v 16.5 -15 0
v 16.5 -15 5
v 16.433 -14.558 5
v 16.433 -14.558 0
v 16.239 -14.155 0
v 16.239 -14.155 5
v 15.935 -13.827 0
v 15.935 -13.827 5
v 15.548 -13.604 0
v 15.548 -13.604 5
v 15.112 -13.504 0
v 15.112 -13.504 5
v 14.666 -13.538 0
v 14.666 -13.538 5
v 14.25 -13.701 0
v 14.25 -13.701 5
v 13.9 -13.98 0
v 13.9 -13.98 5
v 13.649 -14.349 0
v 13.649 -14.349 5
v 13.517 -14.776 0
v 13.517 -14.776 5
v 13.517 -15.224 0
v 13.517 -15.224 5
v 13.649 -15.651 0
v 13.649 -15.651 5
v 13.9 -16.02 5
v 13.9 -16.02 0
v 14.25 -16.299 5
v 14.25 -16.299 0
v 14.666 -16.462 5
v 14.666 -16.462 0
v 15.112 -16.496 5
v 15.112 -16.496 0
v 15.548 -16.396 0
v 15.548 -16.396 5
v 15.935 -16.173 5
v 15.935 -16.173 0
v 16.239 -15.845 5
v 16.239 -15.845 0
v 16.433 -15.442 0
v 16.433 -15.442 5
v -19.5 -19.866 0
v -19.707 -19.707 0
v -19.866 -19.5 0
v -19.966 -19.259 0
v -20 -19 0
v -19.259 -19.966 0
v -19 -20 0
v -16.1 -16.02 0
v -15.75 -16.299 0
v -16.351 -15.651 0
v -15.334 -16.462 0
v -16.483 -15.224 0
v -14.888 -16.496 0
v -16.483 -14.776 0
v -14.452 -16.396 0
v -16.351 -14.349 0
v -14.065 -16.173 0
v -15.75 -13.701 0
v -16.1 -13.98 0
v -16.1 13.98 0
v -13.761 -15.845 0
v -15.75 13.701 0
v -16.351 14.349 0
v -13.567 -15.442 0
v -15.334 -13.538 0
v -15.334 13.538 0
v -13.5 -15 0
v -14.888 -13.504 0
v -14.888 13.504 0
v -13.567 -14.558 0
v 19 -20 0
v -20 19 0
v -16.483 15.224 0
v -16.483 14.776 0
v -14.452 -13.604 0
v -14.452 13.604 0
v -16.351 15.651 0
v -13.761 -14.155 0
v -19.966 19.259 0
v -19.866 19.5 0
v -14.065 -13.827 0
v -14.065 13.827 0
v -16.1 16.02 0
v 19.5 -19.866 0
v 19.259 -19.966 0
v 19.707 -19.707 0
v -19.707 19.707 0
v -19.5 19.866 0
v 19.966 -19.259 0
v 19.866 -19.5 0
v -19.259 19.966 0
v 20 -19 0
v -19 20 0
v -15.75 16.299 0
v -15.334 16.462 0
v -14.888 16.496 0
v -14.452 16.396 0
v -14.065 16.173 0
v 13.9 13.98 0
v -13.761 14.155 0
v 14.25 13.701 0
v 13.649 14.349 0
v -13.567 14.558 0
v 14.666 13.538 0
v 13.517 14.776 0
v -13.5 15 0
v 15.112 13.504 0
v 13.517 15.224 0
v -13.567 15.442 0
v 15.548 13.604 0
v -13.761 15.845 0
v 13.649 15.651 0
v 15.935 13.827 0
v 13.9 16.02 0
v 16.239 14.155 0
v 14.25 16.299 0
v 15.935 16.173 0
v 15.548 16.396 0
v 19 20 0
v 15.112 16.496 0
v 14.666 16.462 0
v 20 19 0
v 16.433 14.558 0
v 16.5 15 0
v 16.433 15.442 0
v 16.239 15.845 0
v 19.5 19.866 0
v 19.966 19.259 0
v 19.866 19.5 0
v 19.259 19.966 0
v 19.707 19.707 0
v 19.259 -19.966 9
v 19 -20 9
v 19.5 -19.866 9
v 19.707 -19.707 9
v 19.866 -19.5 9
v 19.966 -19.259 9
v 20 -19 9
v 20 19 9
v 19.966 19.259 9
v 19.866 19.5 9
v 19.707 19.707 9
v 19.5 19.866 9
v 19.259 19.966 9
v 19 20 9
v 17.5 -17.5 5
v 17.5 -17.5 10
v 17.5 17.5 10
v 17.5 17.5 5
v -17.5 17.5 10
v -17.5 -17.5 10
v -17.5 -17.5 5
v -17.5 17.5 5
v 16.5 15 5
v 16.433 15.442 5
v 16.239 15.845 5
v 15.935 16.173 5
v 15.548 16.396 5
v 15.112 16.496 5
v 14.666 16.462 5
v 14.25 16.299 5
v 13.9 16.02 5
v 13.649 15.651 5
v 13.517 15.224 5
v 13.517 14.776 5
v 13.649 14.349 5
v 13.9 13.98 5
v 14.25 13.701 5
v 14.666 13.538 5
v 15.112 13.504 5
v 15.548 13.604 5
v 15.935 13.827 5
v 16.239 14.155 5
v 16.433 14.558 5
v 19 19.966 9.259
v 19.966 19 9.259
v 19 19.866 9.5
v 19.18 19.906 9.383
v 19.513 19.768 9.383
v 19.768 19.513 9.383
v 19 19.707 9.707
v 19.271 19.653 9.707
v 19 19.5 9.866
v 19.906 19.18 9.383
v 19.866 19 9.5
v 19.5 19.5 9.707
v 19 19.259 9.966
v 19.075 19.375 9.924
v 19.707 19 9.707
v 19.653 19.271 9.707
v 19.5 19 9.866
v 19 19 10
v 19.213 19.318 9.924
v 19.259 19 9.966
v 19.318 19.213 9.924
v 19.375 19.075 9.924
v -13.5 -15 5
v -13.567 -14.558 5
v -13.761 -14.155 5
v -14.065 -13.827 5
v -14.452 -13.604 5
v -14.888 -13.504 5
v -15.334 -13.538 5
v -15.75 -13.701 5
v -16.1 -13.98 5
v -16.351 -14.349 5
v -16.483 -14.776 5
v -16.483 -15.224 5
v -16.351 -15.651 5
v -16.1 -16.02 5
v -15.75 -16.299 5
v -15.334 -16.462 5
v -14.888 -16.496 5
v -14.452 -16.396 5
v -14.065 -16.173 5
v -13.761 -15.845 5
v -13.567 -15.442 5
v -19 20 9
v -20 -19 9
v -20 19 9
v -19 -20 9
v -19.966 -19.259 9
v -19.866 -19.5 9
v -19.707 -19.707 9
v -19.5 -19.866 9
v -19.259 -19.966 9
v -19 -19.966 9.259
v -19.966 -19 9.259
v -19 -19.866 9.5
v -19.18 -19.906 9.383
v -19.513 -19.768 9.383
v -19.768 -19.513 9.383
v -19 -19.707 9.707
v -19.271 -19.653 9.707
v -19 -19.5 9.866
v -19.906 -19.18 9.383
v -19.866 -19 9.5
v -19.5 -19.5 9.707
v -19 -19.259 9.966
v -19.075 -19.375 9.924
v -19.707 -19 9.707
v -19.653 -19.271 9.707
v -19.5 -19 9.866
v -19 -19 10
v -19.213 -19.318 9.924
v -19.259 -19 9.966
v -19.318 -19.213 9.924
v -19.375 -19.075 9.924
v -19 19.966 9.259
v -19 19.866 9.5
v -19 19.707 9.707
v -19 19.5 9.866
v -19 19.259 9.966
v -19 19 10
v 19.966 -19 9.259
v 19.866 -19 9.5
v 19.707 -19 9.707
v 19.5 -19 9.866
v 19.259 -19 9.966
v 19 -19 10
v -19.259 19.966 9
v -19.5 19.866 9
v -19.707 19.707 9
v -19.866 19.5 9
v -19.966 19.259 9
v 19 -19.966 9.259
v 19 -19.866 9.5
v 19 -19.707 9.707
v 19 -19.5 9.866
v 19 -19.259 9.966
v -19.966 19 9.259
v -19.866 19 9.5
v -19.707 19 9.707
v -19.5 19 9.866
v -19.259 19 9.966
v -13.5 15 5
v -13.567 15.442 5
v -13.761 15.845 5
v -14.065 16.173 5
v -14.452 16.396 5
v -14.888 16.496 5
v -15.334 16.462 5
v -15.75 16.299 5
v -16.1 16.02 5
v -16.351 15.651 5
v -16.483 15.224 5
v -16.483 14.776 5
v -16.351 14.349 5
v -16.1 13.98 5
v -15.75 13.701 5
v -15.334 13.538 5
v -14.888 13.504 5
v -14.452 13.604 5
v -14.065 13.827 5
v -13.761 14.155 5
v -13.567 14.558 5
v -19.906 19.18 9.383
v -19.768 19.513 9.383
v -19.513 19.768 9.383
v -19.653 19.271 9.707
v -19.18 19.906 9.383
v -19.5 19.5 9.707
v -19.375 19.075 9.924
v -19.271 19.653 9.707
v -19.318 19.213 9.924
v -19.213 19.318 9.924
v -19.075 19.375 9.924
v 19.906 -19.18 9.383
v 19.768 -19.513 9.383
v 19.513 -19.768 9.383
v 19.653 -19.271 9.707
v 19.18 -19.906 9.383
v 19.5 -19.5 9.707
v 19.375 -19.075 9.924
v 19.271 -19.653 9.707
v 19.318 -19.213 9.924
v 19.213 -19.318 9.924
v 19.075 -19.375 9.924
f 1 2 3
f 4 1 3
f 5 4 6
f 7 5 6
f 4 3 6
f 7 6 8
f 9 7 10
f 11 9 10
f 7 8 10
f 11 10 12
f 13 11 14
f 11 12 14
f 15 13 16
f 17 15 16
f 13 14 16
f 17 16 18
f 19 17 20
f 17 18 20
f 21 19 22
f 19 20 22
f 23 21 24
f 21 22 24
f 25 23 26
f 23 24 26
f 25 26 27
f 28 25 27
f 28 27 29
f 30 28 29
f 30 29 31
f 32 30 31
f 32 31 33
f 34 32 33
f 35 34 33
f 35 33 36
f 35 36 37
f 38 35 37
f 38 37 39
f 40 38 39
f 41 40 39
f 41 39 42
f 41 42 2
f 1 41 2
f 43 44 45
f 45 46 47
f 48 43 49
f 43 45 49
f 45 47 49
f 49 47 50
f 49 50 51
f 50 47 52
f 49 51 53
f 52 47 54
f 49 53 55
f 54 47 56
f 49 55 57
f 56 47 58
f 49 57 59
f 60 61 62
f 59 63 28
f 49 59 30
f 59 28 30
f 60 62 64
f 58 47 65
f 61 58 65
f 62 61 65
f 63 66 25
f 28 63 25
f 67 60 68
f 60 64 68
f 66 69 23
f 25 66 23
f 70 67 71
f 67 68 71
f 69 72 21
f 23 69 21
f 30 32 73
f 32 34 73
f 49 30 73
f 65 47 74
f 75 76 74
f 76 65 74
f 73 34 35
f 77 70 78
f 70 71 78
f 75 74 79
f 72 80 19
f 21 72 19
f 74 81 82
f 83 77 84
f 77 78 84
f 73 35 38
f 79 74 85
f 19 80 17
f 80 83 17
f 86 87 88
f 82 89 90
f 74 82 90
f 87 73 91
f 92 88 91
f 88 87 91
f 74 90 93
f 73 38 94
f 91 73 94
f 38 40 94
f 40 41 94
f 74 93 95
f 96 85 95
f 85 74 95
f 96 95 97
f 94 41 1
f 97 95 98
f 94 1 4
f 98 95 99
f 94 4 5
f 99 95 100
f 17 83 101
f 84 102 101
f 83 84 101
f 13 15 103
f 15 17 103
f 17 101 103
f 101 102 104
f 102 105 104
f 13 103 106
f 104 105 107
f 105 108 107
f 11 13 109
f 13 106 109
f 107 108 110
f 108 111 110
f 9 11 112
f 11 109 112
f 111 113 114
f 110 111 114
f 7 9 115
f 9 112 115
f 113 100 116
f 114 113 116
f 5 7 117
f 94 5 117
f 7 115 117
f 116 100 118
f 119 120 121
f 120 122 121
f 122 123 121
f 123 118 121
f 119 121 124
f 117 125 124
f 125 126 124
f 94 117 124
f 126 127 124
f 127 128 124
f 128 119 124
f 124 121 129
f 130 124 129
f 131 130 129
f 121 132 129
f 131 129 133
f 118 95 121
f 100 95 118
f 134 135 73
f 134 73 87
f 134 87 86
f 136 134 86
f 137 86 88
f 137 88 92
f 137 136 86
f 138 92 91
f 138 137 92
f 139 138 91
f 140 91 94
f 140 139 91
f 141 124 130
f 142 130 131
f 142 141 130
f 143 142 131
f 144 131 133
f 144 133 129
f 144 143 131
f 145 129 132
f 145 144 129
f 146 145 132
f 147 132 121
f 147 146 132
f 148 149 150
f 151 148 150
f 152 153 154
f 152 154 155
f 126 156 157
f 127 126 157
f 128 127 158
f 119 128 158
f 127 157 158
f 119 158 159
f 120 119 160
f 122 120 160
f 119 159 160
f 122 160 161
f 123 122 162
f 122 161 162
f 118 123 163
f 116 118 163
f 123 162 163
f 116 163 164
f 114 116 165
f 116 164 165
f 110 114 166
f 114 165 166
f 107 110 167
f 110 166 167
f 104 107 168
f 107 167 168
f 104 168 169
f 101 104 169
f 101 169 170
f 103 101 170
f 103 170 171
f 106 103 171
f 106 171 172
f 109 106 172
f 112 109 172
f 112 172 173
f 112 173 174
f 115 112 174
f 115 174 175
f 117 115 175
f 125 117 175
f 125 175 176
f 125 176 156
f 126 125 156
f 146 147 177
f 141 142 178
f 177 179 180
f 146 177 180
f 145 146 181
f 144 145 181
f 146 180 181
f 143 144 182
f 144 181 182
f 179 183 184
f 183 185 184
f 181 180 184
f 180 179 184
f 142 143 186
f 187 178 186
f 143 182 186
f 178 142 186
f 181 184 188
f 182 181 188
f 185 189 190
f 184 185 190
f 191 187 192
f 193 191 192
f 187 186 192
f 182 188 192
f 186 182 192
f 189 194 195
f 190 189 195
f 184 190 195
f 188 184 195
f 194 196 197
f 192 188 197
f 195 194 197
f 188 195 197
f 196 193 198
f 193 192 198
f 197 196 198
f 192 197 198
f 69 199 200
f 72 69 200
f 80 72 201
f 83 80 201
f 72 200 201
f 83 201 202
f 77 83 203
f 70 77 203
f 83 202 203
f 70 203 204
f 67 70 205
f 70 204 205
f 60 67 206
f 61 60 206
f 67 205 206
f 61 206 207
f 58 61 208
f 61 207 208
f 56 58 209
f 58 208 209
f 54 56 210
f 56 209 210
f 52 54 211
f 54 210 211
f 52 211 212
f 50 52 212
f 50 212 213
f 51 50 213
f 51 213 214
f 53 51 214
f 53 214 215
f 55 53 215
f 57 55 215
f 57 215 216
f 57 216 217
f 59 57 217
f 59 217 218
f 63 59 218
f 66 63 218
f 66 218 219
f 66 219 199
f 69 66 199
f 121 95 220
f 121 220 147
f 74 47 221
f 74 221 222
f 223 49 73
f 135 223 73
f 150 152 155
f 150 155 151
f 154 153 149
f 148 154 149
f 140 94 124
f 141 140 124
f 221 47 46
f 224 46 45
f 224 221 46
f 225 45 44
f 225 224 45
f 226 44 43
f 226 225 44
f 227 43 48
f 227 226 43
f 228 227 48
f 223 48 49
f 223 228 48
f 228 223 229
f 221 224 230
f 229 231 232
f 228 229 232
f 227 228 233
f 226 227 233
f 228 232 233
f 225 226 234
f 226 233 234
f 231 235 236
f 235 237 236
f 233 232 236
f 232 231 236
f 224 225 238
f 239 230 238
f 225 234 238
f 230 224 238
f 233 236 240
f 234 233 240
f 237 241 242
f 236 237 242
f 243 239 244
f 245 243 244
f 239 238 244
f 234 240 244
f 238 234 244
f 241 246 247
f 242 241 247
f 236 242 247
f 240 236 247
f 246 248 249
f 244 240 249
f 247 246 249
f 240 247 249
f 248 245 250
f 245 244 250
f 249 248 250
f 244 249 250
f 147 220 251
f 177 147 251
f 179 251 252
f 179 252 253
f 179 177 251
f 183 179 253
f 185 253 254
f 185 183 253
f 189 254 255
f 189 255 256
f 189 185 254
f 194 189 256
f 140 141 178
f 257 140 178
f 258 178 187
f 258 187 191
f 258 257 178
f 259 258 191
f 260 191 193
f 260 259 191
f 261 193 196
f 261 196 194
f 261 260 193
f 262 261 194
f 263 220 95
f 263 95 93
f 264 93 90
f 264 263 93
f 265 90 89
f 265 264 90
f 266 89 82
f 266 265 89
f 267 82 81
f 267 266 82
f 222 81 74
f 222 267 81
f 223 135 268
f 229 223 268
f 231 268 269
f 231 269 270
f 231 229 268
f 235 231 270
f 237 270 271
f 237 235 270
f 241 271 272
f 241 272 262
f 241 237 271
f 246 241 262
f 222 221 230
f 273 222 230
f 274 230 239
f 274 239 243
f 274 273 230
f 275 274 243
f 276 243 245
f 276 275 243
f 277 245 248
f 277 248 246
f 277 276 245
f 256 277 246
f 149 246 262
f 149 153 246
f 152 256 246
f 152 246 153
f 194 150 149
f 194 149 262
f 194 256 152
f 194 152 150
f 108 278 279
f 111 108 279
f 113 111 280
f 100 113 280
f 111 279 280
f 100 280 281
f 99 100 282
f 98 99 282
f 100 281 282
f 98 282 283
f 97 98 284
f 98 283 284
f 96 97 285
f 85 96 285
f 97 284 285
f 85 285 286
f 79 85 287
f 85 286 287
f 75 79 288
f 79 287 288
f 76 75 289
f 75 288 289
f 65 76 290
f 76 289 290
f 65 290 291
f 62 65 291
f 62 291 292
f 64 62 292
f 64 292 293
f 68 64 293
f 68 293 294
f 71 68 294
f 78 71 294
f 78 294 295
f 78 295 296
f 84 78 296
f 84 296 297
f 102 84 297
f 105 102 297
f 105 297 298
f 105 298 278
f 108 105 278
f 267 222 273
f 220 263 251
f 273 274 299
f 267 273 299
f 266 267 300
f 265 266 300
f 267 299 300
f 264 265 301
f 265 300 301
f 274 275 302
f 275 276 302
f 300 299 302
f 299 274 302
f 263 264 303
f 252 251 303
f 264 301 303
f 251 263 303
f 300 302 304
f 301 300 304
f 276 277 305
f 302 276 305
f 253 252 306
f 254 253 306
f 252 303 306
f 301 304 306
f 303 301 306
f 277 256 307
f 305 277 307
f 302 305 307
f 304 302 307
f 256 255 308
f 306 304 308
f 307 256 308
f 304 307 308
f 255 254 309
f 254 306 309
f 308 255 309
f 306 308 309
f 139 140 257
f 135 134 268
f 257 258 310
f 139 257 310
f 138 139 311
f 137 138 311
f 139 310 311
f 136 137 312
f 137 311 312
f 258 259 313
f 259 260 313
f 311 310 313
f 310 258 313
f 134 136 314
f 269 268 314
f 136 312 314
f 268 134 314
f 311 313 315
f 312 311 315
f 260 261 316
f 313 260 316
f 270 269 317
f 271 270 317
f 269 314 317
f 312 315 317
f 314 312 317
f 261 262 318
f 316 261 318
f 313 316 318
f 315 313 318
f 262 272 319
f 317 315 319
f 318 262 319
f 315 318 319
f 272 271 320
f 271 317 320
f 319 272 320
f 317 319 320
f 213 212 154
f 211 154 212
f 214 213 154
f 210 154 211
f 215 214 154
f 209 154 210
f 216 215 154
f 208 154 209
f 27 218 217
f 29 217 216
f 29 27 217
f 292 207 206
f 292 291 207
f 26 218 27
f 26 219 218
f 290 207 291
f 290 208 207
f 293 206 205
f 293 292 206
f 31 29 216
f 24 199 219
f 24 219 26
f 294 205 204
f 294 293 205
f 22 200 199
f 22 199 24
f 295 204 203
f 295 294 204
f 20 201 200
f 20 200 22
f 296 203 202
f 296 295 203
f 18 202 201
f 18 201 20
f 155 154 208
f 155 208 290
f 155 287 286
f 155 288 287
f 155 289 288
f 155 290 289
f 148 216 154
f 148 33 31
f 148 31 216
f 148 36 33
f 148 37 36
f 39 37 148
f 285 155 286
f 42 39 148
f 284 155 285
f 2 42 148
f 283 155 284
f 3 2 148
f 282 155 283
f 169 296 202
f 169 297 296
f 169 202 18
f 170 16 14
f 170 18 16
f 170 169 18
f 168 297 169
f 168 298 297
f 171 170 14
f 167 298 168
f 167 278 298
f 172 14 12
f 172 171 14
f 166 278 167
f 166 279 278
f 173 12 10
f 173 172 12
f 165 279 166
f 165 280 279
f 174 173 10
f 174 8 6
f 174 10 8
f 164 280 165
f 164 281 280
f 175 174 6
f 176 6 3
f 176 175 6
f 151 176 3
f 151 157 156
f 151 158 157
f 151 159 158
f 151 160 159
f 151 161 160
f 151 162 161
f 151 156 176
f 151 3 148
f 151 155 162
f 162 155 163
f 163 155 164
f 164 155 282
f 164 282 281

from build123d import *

# Parameters (mm, degrees)
SKETCH_W     = 40
SKETCH_H     = 40
PAD_DEPTH    = 10
SKETCH001_W  = 35
SKETCH001_H  = 35
POCKET_DEPTH = 5
FILLET_R     = 1
FILLET001_R  = 1
FILLET002_R  = 1
FILLET003_R  = 1
FILLET004_R  = 1
SKETCH002_R  = 1.5
HOLE_DEPTH   = 25


with BuildPart() as part:
    # Sketch → Pad (new body)
    with BuildSketch(Plane.XY):
        Rectangle(SKETCH_W, SKETCH_H)
    extrude(amount=PAD_DEPTH)

    # Sketch001 (on Face6 of Pad) → Pocket (cut)
    with BuildSketch(Plane.XY.offset(10)):
        Rectangle(SKETCH001_W, SKETCH001_H)
    extrude(amount=-POCKET_DEPTH, mode=Mode.SUBTRACT)

    # Fillet
    fillet_edges = [part.edges().sort_by_distance(p)[0] for p in [
        (-20, -20, 5),
    ]]
    fillet(fillet_edges, radius=FILLET_R)

    # Fillet001
    fillet001_edges = [part.edges().sort_by_distance(p)[0] for p in [
        (20, -20, 5),
    ]]
    fillet(fillet001_edges, radius=FILLET001_R)

    # Fillet002
    fillet002_edges = [part.edges().sort_by_distance(p)[0] for p in [
        (20, 20, 5),
    ]]
    fillet(fillet002_edges, radius=FILLET002_R)

    # Fillet003
    fillet003_edges = [part.edges().sort_by_distance(p)[0] for p in [
        (-20, 20, 5),
    ]]
    fillet(fillet003_edges, radius=FILLET003_R)

    # Fillet004
    fillet004_edges = [part.edges().sort_by_distance(p)[0] for p in [
        (-20, 0, 10),
    ]]
    fillet(fillet004_edges, radius=FILLET004_R)

    # Sketch002 (on Face23 of Fillet004) → Hole (cut)
    with BuildSketch(Plane.XY.offset(5)):
        with Locations((-15, 15)):
            Circle(SKETCH002_R)
        with Locations((15, 15)):
            Circle(SKETCH002_R)
        with Locations((-15, -15)):
            Circle(SKETCH002_R)
        with Locations((15, -15)):
            Circle(SKETCH002_R)
    extrude(amount=-HOLE_DEPTH, mode=Mode.SUBTRACT)


solid = part.part
